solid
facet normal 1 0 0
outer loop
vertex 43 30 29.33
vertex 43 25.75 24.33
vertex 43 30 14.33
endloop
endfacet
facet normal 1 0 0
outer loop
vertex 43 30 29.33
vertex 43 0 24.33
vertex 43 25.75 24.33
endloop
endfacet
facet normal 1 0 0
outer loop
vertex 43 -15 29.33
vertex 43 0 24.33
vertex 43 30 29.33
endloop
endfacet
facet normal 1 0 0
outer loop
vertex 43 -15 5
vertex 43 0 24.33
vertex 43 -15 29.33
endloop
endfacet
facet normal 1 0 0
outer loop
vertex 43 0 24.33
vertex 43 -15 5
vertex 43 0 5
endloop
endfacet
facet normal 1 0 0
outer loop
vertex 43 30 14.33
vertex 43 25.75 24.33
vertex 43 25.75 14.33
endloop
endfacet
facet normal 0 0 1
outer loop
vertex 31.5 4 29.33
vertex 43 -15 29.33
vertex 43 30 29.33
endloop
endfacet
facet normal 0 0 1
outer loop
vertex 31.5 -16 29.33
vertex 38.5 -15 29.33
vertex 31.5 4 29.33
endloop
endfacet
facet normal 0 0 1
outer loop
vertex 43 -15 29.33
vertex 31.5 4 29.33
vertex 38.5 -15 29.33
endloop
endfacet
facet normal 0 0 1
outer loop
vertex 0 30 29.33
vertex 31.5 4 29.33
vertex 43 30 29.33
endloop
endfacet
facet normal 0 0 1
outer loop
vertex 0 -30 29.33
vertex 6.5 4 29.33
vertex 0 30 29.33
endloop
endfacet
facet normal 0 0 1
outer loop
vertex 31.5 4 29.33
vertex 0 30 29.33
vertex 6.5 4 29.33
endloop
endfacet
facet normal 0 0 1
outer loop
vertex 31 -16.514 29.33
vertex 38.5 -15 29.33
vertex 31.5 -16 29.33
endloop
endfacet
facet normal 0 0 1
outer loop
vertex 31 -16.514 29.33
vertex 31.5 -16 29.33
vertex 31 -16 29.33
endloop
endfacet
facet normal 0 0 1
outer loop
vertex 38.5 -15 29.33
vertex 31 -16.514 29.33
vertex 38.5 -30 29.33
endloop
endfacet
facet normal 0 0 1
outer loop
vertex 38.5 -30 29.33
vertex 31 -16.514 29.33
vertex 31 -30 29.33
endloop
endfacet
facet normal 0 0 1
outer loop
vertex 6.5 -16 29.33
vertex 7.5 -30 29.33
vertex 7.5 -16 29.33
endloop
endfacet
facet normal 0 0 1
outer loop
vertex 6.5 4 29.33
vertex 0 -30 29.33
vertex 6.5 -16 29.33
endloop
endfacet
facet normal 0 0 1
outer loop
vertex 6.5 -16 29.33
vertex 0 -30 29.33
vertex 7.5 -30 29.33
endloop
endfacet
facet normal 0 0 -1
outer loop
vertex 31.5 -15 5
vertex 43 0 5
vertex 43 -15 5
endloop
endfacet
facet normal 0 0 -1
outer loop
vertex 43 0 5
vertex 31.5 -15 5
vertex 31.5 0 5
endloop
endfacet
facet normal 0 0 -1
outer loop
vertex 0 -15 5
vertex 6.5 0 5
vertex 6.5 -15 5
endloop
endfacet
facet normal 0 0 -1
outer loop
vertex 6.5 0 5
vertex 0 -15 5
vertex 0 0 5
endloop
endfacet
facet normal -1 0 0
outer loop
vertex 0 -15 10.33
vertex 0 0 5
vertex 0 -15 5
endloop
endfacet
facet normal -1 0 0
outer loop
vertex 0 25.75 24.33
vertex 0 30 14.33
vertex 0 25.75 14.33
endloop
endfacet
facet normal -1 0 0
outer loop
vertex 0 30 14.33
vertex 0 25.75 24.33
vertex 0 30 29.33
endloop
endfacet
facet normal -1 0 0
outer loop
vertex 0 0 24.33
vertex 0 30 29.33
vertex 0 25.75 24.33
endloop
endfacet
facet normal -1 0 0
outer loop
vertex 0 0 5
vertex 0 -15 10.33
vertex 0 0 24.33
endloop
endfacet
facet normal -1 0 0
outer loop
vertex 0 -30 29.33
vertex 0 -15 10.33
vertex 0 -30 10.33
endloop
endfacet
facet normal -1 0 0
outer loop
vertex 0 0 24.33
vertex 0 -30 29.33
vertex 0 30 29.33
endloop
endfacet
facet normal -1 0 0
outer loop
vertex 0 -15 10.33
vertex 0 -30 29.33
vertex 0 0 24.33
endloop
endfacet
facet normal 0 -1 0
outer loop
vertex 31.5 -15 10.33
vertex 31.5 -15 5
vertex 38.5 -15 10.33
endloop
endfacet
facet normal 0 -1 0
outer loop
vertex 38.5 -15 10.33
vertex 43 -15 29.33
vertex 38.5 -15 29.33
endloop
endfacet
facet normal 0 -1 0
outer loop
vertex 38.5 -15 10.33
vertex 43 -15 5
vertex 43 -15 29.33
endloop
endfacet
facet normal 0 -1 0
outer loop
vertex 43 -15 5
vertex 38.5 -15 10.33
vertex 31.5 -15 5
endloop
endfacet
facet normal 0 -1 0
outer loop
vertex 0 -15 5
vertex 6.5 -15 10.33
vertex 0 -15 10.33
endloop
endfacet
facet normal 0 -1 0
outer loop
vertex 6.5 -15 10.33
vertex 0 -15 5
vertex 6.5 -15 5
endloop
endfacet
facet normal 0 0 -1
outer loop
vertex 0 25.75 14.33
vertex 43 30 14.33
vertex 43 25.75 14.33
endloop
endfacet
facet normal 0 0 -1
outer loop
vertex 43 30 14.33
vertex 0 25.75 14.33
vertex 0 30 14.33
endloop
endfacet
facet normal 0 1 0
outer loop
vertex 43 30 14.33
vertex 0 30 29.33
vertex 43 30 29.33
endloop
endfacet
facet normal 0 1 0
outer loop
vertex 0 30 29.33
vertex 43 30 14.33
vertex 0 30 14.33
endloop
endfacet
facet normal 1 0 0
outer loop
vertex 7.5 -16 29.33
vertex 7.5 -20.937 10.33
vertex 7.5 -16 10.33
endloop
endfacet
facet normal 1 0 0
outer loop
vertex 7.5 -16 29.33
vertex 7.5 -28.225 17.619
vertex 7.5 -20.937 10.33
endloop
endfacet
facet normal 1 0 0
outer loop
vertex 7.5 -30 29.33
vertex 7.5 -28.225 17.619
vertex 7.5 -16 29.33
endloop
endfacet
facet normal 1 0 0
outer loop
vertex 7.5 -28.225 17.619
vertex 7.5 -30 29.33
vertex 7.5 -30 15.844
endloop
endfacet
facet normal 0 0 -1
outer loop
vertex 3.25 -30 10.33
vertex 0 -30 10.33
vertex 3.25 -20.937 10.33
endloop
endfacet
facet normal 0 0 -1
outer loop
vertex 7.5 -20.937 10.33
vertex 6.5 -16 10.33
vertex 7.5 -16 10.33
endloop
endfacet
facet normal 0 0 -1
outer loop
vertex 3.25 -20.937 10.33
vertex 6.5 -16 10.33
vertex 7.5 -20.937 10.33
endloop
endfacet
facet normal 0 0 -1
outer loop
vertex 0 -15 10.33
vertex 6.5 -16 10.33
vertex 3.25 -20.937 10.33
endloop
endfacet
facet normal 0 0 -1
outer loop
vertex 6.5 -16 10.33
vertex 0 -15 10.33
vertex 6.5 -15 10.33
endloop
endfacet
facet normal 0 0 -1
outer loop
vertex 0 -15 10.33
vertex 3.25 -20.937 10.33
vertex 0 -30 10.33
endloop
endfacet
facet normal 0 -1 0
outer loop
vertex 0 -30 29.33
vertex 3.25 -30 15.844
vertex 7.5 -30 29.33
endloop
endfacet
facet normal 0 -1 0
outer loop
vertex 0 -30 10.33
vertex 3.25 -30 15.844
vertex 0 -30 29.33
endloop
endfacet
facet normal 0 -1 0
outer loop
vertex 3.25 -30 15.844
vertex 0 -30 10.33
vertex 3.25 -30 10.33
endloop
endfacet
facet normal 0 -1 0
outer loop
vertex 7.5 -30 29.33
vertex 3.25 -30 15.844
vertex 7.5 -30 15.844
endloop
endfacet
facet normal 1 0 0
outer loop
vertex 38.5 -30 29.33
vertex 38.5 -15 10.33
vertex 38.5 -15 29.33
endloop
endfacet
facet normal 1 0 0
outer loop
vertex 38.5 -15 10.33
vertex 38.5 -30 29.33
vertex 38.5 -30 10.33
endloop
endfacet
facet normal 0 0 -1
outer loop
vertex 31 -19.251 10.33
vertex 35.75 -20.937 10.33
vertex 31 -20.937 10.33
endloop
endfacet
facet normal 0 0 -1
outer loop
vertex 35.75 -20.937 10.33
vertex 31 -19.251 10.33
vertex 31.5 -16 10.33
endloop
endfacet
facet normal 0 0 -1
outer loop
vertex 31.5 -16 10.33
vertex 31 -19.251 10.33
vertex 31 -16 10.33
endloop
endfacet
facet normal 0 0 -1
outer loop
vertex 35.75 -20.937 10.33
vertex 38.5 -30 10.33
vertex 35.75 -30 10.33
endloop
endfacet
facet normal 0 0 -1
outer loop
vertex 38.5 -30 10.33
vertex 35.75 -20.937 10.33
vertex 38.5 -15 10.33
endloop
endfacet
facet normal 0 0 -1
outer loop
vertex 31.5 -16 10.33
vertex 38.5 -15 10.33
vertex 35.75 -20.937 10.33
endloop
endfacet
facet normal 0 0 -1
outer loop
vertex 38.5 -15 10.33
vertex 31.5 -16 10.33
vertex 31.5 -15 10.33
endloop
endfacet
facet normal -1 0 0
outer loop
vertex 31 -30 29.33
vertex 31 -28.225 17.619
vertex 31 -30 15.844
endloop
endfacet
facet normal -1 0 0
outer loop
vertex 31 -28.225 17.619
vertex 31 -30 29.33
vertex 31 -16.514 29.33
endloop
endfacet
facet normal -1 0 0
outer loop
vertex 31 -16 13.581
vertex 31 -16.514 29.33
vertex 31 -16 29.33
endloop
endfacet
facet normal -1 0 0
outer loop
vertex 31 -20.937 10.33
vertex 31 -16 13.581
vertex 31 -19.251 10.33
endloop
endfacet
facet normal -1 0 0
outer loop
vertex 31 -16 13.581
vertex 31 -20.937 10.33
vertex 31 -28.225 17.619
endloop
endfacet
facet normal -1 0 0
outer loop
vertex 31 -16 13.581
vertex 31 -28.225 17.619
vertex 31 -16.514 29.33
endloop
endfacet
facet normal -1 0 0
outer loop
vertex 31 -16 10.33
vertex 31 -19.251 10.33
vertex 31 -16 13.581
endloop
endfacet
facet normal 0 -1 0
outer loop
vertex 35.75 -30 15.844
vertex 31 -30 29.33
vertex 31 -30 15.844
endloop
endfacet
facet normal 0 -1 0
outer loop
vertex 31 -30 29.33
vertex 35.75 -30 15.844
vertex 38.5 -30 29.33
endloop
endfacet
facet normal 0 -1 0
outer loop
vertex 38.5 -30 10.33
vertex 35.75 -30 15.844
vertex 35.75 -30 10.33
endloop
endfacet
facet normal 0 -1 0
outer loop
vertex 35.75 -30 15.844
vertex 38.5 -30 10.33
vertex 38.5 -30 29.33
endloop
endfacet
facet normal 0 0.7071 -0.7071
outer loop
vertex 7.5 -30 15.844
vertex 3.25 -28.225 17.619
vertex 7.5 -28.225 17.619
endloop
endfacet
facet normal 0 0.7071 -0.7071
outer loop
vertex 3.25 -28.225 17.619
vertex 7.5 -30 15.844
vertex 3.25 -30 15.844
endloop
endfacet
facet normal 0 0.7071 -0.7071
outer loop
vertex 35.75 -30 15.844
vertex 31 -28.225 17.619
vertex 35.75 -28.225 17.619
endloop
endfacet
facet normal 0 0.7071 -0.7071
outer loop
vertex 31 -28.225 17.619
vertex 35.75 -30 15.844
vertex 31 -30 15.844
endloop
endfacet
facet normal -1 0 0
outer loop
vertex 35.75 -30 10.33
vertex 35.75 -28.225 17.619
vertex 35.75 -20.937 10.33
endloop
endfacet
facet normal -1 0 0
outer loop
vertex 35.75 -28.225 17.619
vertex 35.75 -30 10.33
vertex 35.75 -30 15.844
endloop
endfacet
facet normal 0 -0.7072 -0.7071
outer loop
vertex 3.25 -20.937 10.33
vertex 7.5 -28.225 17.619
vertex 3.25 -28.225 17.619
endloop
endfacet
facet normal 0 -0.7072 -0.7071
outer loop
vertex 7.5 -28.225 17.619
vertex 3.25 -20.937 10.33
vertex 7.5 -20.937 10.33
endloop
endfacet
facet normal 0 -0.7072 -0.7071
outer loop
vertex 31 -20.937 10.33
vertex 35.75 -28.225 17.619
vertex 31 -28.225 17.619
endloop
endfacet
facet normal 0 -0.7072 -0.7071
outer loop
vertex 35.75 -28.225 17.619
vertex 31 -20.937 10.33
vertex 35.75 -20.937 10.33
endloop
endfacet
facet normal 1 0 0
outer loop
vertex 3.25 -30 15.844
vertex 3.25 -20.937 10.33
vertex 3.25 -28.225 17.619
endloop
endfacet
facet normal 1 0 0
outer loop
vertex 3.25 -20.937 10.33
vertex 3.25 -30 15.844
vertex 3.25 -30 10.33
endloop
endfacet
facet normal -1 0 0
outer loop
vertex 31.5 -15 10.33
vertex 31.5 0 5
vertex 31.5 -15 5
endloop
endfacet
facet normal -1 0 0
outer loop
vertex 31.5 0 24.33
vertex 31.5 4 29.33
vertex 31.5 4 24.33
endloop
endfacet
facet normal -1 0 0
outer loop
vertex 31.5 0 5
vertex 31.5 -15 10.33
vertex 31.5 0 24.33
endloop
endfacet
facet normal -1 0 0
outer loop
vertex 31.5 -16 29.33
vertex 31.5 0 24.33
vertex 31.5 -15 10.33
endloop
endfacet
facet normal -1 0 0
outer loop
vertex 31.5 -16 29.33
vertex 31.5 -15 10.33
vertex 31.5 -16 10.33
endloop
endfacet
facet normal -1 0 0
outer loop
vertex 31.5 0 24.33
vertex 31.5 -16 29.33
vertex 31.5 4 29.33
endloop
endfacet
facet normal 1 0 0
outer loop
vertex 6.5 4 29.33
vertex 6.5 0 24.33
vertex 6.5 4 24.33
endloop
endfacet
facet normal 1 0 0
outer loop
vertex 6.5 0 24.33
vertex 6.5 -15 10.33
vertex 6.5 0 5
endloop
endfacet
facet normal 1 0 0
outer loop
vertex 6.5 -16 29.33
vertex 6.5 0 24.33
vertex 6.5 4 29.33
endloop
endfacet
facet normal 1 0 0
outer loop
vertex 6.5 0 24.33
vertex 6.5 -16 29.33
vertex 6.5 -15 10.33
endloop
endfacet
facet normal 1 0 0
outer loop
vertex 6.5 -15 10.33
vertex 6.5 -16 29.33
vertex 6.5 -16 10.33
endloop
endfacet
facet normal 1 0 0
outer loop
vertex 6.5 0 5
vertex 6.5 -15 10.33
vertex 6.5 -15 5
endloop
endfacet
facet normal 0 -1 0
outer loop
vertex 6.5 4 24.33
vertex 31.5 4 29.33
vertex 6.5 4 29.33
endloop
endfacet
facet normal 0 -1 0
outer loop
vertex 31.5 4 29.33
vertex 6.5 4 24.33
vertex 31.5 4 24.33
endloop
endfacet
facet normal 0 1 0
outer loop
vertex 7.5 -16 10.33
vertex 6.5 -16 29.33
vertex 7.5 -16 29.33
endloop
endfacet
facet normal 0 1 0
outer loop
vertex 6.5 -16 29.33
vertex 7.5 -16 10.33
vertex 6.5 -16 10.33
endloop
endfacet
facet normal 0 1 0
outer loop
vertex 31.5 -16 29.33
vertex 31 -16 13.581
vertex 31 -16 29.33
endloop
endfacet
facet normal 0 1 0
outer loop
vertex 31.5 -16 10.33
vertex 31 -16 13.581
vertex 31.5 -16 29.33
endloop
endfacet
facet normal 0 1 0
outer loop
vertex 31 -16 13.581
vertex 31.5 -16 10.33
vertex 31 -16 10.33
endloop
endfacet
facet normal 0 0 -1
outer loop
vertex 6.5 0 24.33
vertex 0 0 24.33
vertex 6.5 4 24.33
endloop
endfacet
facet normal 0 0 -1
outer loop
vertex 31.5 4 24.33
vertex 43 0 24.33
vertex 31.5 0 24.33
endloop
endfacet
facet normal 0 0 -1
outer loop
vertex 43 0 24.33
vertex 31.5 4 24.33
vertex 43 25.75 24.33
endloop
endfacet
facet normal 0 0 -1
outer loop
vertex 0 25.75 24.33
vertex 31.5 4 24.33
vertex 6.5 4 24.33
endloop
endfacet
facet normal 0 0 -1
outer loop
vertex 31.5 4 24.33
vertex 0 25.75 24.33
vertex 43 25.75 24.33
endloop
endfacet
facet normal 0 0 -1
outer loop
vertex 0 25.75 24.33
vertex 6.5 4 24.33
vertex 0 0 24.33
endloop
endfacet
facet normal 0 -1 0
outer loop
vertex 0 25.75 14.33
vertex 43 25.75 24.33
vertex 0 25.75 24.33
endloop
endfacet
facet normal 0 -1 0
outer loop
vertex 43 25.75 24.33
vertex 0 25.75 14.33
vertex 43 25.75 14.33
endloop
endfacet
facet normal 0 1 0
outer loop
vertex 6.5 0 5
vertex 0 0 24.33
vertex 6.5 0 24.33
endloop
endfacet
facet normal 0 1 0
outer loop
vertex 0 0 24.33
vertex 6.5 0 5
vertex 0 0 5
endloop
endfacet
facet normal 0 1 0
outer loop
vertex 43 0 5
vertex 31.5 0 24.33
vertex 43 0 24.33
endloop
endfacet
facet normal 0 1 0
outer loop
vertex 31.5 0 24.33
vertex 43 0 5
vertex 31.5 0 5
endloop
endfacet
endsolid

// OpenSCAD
//Auto Tilter
use <../lib/gears.scad>

SERVO_HEIGHT = 23.5;
SERVO_WIDTH = 23;
SERVO_DEPTH = 11.5;

BAR_HEIGHT = 24.33;
BAR_WIDTH = 25.75;

//Blind Hardware
//================

module bar(){
	cube(size = [300,BAR_WIDTH,BAR_HEIGHT]);
}

module WandTilter(){
	$fa = 1;
	$fs = 0.1;
	$fn = 40;
	height = 28.13;
	radius = 2.75;
	difference(){
		cylinder(h=height, r = radius);
		translate([-.4,1,0]) cube (size = [3.2,2.0,12.4]);
		translate([-.4,-3,0]) cube (size = [3.2,2.0,12.4]);
	}
}

module BlindAssembly(){
	bar();
	WandTilter();
}

module servoGear() {
	translate([0,-12 * 400 / 180,0]){
		rotate([0,0,360/24]) {
			gear (number_of_teeth=12,
				circular_pitch=400,
				hub_diameter=0);
		}
	}
}

module servo() {
	union() {
	translate([5.5,5.5,-3]) {
		union() {
			for (a =[0:1]) rotate([0,0,90*a]) 
				difference() {
				hull() for(b = [0:1]) mirror([0 ,b, 0]) translate([0,8.5,0]) cylinder(r=1.5, h=0.9);
				for(b = [0:1]) mirror([0 ,b, 0]) translate([0,8.5,0]) cylinder(r=0.4, h=1);
			}
			cylinder(h=3, r=2.75);
		}
	}
	cube(size= [SERVO_WIDTH, SERVO_DEPTH, SERVO_HEIGHT]);
	translate([-(32.5 - SERVO_WIDTH) / 2,0,0]) cube([32.5,SERVO_DEPTH,SERVO_HEIGHT - 17]);
	}
}

//Gears
//================
module WandGear(){
	difference(){
		gear (number_of_teeth=12,
			circular_pitch=400,
			hub_diameter=0);
		WandTilter();
	}
}

module gearAssembly() {
	rotate([-45,0,0]) translate([0 ,0,-25]) {
	translate([12 * 400 / 180 / 2,0,0]) {
		WandTilter();
		WandGear();
		servoGear();
	}
	translate([8,-(SERVO_DEPTH /2) - (12 * 400 / 180), 11]) servo();
};
}

module clip() {
	difference() {
		union() {
			translate([0,-15,5]) cube([SERVO_WIDTH + 20,30,BAR_HEIGHT]);
			translate([0,0,14.33]) cube([SERVO_WIDTH + 20,30,15]);
			translate([0,-30,10.33]) cube([(32.5 - SERVO_WIDTH) - 2,20,19]);
			translate([SERVO_WIDTH + 8,-30,10.33]) cube([(32.5 - SERVO_WIDTH) - 2,20,19]);
		}
		translate([(SERVO_WIDTH +10)/ 2 - 10,-16,-10]) cube([25,20,50]);
		bar();
		gearAssembly();
	}
}

//bar();
//gearAssembly();
clip();
